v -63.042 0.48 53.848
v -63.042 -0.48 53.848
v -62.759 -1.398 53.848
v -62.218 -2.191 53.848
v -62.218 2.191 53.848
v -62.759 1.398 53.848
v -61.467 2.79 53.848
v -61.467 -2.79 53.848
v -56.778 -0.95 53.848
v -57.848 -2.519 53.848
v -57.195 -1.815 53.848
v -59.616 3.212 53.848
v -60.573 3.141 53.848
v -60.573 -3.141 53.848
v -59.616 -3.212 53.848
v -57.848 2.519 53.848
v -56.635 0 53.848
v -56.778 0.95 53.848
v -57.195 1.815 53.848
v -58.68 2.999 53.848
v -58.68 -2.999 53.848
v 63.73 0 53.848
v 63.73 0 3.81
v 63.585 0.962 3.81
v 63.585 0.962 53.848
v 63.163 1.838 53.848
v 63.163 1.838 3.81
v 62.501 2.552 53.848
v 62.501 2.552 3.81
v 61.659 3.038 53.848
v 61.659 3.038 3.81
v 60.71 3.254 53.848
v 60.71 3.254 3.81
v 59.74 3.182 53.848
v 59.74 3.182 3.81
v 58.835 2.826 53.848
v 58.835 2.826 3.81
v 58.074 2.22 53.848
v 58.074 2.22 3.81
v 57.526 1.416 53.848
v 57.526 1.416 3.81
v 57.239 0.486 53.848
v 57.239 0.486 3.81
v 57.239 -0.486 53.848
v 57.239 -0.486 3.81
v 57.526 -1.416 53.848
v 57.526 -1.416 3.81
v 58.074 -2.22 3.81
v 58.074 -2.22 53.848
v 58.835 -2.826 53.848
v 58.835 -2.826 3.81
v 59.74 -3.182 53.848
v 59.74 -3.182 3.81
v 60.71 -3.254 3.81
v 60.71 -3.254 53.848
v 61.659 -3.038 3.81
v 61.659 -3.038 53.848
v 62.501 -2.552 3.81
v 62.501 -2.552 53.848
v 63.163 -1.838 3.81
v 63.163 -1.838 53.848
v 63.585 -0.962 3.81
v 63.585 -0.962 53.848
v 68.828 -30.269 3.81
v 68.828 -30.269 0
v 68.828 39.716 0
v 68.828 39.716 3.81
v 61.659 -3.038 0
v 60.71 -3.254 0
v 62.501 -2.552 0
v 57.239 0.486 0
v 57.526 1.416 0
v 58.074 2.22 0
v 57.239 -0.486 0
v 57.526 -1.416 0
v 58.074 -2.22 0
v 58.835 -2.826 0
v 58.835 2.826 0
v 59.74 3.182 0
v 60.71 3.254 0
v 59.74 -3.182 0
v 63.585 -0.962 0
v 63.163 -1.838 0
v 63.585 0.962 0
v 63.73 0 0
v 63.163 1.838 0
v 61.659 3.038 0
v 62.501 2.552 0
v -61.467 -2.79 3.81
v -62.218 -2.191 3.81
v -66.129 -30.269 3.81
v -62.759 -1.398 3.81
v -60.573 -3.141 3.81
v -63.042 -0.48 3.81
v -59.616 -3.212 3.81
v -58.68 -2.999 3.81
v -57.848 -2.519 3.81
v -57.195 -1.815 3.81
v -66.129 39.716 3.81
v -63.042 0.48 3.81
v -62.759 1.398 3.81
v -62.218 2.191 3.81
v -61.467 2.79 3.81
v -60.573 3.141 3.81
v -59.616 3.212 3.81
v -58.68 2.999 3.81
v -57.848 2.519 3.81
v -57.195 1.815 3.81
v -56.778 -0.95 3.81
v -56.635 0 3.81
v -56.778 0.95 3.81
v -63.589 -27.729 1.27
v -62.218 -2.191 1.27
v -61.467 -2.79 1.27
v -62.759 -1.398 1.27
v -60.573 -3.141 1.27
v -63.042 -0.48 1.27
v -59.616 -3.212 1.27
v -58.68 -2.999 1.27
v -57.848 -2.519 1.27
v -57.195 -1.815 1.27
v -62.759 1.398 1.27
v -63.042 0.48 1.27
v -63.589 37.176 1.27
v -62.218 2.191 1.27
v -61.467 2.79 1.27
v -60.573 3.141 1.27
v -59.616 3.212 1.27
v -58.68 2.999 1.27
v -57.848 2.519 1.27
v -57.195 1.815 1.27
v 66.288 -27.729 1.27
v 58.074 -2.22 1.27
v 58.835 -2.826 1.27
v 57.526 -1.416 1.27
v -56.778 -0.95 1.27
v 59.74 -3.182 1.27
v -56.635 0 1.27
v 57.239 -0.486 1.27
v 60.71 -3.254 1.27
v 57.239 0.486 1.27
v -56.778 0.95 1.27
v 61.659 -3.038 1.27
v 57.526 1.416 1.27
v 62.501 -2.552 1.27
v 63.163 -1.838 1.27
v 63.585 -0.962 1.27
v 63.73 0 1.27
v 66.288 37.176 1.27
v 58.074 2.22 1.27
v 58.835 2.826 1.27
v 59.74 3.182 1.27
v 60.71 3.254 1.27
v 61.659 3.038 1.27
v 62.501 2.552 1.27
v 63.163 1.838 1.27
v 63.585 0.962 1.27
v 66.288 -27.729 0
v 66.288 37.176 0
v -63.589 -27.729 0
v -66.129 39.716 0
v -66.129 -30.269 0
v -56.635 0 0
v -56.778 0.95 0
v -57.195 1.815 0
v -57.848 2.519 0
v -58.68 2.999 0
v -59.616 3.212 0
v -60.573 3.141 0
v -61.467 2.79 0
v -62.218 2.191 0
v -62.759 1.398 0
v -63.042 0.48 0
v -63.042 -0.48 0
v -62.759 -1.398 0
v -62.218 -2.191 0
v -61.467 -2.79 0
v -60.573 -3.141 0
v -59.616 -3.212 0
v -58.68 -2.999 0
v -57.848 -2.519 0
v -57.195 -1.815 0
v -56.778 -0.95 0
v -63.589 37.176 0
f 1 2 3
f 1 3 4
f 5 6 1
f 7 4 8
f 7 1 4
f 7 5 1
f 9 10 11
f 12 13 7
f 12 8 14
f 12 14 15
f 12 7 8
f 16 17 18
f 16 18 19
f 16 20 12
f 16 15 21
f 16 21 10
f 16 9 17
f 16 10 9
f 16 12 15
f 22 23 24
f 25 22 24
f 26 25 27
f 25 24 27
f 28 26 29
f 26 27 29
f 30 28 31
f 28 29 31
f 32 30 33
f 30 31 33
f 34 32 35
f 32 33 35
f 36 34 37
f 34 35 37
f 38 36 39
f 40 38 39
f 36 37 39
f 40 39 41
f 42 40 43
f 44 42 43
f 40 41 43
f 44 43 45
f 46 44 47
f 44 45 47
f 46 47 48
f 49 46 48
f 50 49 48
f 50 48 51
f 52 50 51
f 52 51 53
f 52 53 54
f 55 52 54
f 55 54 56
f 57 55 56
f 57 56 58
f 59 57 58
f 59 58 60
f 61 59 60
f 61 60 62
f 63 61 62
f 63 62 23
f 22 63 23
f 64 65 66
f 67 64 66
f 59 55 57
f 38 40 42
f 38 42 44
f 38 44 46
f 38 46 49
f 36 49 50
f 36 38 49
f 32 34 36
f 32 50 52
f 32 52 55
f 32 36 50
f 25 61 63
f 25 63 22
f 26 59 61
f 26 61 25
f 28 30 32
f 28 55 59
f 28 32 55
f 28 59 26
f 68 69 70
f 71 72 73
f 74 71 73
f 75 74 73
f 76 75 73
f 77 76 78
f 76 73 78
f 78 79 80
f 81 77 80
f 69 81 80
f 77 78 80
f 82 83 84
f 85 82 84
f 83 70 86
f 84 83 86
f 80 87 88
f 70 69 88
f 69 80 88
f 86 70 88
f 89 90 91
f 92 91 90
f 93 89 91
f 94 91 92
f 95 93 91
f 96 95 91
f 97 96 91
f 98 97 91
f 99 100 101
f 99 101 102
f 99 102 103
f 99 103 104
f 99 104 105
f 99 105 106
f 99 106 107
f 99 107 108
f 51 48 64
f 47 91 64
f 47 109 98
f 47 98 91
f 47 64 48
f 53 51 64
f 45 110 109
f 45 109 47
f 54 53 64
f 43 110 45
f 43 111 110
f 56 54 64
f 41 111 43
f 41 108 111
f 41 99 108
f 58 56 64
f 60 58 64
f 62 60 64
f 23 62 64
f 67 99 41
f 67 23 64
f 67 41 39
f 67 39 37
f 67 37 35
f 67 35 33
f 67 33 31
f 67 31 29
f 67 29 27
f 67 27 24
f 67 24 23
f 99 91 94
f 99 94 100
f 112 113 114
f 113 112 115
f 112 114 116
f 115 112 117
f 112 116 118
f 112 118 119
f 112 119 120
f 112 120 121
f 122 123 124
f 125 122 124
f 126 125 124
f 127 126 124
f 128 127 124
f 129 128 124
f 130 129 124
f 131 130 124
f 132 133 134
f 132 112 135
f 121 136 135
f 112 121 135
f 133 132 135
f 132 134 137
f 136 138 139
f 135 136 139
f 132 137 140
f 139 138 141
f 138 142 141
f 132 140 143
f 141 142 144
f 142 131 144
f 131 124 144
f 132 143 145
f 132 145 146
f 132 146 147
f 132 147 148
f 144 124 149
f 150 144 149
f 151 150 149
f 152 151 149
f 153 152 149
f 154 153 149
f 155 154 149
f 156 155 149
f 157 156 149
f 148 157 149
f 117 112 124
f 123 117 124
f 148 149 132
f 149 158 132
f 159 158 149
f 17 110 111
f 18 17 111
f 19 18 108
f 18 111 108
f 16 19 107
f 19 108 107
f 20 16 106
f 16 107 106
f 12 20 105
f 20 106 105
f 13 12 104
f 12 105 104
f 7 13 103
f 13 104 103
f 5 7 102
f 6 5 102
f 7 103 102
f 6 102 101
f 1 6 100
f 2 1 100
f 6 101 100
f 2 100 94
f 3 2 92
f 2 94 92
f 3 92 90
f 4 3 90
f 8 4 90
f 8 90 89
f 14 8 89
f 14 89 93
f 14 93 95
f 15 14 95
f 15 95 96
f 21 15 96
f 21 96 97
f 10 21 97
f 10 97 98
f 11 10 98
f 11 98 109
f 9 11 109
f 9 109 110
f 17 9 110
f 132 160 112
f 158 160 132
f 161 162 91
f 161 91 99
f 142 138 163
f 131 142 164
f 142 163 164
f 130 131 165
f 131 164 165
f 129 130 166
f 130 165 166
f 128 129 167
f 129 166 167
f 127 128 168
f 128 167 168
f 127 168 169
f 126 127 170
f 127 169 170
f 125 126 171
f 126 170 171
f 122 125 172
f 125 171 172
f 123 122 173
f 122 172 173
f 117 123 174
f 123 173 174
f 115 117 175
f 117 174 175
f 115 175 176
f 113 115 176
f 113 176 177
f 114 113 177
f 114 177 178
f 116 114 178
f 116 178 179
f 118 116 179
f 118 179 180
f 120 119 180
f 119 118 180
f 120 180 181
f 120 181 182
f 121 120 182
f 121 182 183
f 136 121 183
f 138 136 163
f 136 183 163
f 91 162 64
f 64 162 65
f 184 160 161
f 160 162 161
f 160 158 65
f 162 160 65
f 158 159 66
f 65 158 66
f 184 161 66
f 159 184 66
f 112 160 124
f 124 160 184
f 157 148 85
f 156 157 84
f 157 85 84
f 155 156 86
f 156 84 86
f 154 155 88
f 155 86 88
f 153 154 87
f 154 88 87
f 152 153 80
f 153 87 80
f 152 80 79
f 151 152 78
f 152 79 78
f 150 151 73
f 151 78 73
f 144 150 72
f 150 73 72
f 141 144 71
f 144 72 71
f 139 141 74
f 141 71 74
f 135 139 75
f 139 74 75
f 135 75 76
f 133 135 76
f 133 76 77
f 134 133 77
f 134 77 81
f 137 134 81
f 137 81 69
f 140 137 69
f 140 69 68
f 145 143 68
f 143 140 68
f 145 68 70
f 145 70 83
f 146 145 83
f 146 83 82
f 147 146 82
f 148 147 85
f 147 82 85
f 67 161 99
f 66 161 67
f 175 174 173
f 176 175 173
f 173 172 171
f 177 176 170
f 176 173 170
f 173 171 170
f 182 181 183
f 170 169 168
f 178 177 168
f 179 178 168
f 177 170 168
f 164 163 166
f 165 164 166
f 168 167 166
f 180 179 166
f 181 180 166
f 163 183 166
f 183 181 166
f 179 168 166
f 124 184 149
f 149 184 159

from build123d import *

# Parameters (mm, degrees)
F0_W     = 134.956628
F0_H     = 69.98465
F1_DEPTH = 3.81
F2_T     = -2.54
F3_R     = 3.221336
F3_R_2   = 3.263541
F4_DEPTH = 53.848


with BuildPart() as f1:
    # F0 (on Top) → F1 (new body)
    with BuildSketch(Plane.XY):
        with Locations((1.349568, 4.723483)):
            Rectangle(F0_W, F0_H)
    extrude(amount=F1_DEPTH)

    # F2
    f2_openings = [f1.faces().sort_by_distance(p)[0] for p in [
        (1.349568, 4.723483, 0),
    ]]
    offset(amount=F2_T, openings=f2_openings)

    # F3 (on Top) → F4 (join)
    with BuildSketch(Plane.XY):
        with Locations((-59.856646, 0)):
            Circle(F3_R)
        with Locations((60.466468, 0)):
            Circle(F3_R_2)
    extrude(amount=F4_DEPTH)


solid = f1.part
